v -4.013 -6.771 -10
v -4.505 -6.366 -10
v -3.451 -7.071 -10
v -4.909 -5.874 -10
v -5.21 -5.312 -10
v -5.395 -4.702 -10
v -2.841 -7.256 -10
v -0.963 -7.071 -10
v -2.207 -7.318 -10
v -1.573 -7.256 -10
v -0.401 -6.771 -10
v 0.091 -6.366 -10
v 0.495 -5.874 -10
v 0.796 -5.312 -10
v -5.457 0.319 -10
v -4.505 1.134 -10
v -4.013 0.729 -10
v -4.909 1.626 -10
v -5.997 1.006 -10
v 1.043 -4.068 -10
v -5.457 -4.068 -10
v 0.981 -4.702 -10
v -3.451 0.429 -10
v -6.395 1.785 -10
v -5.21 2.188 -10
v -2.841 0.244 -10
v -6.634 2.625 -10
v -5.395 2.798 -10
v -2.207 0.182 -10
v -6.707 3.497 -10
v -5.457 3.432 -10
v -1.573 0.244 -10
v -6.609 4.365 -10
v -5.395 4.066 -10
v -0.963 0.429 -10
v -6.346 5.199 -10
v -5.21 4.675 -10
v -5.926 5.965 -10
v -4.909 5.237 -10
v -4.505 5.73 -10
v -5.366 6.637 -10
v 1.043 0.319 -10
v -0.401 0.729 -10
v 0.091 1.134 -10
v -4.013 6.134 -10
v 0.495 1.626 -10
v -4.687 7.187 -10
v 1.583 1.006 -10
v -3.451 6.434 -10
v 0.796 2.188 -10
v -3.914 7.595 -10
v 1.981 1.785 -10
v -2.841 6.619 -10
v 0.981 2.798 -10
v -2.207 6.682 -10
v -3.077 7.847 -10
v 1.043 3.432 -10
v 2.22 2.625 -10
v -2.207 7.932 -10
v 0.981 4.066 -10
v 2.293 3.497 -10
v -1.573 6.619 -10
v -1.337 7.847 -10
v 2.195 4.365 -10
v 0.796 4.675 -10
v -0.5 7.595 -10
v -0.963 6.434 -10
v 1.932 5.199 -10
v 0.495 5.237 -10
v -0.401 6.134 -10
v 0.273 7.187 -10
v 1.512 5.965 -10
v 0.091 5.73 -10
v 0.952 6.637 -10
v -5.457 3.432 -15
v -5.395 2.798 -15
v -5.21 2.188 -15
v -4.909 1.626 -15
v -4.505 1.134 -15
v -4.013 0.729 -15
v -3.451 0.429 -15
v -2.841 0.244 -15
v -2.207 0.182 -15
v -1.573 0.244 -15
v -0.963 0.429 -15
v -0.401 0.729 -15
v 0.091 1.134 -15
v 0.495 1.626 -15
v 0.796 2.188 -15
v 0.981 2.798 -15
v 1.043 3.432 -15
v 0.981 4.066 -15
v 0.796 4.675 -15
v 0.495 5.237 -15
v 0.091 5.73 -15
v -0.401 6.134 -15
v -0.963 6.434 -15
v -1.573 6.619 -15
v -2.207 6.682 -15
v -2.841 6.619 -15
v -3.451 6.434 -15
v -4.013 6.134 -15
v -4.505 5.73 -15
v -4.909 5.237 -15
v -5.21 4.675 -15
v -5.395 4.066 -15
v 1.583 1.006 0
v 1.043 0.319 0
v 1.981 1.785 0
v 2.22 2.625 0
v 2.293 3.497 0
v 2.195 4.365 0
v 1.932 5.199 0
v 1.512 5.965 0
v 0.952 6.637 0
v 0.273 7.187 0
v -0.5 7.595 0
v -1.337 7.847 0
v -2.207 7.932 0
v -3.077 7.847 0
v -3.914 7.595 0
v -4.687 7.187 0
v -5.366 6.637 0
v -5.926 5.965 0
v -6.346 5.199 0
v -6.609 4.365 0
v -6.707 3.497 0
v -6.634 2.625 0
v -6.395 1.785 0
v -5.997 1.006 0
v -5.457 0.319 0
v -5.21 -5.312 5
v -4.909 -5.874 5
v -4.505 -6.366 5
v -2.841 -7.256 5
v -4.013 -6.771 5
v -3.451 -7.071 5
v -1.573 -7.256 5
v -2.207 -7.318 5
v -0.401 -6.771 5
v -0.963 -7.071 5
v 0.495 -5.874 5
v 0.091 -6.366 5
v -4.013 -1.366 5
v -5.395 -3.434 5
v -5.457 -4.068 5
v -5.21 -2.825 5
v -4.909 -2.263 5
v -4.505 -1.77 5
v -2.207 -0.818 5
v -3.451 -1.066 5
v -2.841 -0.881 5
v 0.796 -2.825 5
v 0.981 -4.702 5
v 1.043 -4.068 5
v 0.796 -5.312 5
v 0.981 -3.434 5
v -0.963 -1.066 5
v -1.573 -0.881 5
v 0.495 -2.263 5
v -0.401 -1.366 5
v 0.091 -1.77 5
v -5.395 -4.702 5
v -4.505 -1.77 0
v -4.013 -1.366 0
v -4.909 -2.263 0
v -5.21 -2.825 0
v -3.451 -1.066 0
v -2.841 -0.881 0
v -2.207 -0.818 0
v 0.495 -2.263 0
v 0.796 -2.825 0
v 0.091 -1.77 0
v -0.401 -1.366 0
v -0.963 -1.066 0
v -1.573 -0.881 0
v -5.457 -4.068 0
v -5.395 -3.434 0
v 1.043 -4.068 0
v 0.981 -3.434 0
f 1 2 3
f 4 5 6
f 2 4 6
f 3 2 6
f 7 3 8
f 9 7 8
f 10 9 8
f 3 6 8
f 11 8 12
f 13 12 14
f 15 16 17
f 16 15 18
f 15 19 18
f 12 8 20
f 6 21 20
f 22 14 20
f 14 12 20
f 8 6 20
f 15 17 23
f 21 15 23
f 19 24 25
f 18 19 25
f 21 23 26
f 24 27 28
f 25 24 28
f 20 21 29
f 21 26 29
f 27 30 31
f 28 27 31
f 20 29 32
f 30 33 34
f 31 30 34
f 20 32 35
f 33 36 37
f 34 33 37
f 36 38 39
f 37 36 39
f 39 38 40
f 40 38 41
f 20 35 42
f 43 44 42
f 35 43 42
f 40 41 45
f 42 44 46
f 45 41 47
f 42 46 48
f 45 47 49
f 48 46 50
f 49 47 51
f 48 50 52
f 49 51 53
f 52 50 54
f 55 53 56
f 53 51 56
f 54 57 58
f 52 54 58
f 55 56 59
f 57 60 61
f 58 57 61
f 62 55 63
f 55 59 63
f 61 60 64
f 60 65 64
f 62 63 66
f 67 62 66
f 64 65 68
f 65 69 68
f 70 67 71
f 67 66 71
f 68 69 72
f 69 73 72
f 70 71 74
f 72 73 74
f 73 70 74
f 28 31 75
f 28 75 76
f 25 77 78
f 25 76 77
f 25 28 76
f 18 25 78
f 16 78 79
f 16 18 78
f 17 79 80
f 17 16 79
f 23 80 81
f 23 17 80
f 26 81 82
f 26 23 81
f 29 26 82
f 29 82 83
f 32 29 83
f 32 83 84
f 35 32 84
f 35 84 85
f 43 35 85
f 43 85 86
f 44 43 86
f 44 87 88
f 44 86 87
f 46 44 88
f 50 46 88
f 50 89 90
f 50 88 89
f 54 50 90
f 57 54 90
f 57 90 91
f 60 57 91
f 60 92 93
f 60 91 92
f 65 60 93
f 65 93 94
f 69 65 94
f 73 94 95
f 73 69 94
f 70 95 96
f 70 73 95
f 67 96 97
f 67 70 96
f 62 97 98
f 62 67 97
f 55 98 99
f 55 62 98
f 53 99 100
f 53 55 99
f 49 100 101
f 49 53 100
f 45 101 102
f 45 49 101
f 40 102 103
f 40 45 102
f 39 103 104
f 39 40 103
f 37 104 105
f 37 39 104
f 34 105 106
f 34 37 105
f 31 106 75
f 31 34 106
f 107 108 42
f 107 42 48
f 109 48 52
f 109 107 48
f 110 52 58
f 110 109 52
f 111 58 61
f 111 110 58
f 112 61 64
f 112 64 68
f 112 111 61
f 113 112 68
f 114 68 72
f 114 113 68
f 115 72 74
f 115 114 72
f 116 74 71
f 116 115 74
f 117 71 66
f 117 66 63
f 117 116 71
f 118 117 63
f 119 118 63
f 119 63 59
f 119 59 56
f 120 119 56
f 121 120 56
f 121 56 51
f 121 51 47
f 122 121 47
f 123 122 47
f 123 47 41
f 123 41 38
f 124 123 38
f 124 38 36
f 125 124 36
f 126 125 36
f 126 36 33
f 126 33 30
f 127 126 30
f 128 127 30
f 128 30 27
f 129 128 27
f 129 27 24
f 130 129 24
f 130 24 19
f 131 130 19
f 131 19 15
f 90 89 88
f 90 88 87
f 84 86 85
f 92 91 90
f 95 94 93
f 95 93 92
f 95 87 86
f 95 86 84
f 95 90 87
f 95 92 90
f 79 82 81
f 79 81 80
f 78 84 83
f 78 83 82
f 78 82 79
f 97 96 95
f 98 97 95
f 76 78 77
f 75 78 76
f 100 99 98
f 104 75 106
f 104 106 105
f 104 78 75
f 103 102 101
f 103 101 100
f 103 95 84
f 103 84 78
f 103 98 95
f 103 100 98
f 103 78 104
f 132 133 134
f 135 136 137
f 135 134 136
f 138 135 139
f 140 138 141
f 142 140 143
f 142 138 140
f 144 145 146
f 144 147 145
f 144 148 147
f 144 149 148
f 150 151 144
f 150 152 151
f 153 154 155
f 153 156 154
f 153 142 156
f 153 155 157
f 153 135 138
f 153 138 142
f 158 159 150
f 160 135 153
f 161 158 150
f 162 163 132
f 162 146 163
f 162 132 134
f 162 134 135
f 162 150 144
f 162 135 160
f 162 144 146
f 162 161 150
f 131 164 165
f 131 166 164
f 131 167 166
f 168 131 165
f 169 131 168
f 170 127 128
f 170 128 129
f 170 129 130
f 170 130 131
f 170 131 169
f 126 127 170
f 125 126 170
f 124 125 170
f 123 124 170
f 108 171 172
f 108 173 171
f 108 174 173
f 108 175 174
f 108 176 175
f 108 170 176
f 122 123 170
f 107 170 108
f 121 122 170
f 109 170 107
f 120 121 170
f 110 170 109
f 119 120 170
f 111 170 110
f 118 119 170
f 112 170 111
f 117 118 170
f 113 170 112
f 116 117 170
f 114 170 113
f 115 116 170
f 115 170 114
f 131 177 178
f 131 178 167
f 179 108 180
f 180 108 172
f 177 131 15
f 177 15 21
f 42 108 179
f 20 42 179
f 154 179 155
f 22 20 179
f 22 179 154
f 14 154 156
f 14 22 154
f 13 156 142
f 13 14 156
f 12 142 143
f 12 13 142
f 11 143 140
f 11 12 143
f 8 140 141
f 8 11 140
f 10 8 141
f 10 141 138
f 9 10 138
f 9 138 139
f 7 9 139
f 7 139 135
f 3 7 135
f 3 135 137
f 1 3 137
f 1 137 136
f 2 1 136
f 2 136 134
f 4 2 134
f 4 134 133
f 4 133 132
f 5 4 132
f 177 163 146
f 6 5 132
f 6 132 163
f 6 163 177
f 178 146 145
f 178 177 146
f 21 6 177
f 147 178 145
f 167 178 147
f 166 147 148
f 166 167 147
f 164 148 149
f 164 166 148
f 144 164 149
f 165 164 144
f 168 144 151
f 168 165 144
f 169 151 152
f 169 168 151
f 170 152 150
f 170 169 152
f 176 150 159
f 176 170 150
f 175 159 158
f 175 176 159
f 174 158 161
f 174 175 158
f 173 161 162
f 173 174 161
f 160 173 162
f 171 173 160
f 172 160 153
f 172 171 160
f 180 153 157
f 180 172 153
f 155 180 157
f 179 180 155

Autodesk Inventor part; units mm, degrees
ref_plane "YZ Plane" through (0, 0, 0) normal (1, 0, 0) x (0, 1, 0)
ref_plane "XZ Plane" through (0, 0, 0) normal (0, 1, 0) x (-1, 0, 0)
ref_plane "XY Plane" through (0, 0, 0) normal (0, 0, 1) x (1, 0, 0)
sketch "Sketch2" plane through (0, 0, 0) normal (0, 0, 1) x (1, 0, 0)
  line L0 (1.043, 0.3192) -> (1.043, -4.0683)
  arc A0 (1.043, 0.3192) -> (-5.457, 0.3192) centre (-2.207, 3.4317) ccw
  circle A1 centre (-2.207, -4.0683) radius 3.25
  circle A2 centre (-2.207, 3.4317) radius 3.25
  line L1 (-2.207, 14.5026) -> (-2.207, -15.0875) construction
  line L2 (-5.457, 0.3192) -> (-5.457, -4.0683)
  point P0 (-2.7063, -6.309)
  dimension "d6" = 6.5
  dimension "d8" = 9
  dimension "d9" = 7.5
extrude "Extrusion1" add sketch "Sketch2" along normal blind 5 contours A1
extrude "Extrusion2" add sketch "Sketch2" against normal blind 10 contours L0 A1 L2 A0 | A1 | A2
sketch "Sketch3" plane through (0, 0, -10) normal (0, 0, -1) x (-1, 0, 0)
  circle A0 centre (2.207, 3.4317) radius 3.25 projected
  arc A1 (5.457, 0.3192) -> (-1.043, 0.3192) centre (2.207, 3.4317) ccw projected
  point P0 (0, 0)
extrude "Extrusion3" add sketch "Sketch3" along normal blind 5
equation "\"d6\" = R"
equation "\"d8\" = R1"
equation "\"d0\" = thickness"
equation "\"d2\" = 2 * thickness"
equation "\"d4\" = thickness"
equation "\"R\" = 6.5"
equation "\"thickness\" = 5"
equation "\"width\" = 6.5"
equation "\"R1\" = 9"
